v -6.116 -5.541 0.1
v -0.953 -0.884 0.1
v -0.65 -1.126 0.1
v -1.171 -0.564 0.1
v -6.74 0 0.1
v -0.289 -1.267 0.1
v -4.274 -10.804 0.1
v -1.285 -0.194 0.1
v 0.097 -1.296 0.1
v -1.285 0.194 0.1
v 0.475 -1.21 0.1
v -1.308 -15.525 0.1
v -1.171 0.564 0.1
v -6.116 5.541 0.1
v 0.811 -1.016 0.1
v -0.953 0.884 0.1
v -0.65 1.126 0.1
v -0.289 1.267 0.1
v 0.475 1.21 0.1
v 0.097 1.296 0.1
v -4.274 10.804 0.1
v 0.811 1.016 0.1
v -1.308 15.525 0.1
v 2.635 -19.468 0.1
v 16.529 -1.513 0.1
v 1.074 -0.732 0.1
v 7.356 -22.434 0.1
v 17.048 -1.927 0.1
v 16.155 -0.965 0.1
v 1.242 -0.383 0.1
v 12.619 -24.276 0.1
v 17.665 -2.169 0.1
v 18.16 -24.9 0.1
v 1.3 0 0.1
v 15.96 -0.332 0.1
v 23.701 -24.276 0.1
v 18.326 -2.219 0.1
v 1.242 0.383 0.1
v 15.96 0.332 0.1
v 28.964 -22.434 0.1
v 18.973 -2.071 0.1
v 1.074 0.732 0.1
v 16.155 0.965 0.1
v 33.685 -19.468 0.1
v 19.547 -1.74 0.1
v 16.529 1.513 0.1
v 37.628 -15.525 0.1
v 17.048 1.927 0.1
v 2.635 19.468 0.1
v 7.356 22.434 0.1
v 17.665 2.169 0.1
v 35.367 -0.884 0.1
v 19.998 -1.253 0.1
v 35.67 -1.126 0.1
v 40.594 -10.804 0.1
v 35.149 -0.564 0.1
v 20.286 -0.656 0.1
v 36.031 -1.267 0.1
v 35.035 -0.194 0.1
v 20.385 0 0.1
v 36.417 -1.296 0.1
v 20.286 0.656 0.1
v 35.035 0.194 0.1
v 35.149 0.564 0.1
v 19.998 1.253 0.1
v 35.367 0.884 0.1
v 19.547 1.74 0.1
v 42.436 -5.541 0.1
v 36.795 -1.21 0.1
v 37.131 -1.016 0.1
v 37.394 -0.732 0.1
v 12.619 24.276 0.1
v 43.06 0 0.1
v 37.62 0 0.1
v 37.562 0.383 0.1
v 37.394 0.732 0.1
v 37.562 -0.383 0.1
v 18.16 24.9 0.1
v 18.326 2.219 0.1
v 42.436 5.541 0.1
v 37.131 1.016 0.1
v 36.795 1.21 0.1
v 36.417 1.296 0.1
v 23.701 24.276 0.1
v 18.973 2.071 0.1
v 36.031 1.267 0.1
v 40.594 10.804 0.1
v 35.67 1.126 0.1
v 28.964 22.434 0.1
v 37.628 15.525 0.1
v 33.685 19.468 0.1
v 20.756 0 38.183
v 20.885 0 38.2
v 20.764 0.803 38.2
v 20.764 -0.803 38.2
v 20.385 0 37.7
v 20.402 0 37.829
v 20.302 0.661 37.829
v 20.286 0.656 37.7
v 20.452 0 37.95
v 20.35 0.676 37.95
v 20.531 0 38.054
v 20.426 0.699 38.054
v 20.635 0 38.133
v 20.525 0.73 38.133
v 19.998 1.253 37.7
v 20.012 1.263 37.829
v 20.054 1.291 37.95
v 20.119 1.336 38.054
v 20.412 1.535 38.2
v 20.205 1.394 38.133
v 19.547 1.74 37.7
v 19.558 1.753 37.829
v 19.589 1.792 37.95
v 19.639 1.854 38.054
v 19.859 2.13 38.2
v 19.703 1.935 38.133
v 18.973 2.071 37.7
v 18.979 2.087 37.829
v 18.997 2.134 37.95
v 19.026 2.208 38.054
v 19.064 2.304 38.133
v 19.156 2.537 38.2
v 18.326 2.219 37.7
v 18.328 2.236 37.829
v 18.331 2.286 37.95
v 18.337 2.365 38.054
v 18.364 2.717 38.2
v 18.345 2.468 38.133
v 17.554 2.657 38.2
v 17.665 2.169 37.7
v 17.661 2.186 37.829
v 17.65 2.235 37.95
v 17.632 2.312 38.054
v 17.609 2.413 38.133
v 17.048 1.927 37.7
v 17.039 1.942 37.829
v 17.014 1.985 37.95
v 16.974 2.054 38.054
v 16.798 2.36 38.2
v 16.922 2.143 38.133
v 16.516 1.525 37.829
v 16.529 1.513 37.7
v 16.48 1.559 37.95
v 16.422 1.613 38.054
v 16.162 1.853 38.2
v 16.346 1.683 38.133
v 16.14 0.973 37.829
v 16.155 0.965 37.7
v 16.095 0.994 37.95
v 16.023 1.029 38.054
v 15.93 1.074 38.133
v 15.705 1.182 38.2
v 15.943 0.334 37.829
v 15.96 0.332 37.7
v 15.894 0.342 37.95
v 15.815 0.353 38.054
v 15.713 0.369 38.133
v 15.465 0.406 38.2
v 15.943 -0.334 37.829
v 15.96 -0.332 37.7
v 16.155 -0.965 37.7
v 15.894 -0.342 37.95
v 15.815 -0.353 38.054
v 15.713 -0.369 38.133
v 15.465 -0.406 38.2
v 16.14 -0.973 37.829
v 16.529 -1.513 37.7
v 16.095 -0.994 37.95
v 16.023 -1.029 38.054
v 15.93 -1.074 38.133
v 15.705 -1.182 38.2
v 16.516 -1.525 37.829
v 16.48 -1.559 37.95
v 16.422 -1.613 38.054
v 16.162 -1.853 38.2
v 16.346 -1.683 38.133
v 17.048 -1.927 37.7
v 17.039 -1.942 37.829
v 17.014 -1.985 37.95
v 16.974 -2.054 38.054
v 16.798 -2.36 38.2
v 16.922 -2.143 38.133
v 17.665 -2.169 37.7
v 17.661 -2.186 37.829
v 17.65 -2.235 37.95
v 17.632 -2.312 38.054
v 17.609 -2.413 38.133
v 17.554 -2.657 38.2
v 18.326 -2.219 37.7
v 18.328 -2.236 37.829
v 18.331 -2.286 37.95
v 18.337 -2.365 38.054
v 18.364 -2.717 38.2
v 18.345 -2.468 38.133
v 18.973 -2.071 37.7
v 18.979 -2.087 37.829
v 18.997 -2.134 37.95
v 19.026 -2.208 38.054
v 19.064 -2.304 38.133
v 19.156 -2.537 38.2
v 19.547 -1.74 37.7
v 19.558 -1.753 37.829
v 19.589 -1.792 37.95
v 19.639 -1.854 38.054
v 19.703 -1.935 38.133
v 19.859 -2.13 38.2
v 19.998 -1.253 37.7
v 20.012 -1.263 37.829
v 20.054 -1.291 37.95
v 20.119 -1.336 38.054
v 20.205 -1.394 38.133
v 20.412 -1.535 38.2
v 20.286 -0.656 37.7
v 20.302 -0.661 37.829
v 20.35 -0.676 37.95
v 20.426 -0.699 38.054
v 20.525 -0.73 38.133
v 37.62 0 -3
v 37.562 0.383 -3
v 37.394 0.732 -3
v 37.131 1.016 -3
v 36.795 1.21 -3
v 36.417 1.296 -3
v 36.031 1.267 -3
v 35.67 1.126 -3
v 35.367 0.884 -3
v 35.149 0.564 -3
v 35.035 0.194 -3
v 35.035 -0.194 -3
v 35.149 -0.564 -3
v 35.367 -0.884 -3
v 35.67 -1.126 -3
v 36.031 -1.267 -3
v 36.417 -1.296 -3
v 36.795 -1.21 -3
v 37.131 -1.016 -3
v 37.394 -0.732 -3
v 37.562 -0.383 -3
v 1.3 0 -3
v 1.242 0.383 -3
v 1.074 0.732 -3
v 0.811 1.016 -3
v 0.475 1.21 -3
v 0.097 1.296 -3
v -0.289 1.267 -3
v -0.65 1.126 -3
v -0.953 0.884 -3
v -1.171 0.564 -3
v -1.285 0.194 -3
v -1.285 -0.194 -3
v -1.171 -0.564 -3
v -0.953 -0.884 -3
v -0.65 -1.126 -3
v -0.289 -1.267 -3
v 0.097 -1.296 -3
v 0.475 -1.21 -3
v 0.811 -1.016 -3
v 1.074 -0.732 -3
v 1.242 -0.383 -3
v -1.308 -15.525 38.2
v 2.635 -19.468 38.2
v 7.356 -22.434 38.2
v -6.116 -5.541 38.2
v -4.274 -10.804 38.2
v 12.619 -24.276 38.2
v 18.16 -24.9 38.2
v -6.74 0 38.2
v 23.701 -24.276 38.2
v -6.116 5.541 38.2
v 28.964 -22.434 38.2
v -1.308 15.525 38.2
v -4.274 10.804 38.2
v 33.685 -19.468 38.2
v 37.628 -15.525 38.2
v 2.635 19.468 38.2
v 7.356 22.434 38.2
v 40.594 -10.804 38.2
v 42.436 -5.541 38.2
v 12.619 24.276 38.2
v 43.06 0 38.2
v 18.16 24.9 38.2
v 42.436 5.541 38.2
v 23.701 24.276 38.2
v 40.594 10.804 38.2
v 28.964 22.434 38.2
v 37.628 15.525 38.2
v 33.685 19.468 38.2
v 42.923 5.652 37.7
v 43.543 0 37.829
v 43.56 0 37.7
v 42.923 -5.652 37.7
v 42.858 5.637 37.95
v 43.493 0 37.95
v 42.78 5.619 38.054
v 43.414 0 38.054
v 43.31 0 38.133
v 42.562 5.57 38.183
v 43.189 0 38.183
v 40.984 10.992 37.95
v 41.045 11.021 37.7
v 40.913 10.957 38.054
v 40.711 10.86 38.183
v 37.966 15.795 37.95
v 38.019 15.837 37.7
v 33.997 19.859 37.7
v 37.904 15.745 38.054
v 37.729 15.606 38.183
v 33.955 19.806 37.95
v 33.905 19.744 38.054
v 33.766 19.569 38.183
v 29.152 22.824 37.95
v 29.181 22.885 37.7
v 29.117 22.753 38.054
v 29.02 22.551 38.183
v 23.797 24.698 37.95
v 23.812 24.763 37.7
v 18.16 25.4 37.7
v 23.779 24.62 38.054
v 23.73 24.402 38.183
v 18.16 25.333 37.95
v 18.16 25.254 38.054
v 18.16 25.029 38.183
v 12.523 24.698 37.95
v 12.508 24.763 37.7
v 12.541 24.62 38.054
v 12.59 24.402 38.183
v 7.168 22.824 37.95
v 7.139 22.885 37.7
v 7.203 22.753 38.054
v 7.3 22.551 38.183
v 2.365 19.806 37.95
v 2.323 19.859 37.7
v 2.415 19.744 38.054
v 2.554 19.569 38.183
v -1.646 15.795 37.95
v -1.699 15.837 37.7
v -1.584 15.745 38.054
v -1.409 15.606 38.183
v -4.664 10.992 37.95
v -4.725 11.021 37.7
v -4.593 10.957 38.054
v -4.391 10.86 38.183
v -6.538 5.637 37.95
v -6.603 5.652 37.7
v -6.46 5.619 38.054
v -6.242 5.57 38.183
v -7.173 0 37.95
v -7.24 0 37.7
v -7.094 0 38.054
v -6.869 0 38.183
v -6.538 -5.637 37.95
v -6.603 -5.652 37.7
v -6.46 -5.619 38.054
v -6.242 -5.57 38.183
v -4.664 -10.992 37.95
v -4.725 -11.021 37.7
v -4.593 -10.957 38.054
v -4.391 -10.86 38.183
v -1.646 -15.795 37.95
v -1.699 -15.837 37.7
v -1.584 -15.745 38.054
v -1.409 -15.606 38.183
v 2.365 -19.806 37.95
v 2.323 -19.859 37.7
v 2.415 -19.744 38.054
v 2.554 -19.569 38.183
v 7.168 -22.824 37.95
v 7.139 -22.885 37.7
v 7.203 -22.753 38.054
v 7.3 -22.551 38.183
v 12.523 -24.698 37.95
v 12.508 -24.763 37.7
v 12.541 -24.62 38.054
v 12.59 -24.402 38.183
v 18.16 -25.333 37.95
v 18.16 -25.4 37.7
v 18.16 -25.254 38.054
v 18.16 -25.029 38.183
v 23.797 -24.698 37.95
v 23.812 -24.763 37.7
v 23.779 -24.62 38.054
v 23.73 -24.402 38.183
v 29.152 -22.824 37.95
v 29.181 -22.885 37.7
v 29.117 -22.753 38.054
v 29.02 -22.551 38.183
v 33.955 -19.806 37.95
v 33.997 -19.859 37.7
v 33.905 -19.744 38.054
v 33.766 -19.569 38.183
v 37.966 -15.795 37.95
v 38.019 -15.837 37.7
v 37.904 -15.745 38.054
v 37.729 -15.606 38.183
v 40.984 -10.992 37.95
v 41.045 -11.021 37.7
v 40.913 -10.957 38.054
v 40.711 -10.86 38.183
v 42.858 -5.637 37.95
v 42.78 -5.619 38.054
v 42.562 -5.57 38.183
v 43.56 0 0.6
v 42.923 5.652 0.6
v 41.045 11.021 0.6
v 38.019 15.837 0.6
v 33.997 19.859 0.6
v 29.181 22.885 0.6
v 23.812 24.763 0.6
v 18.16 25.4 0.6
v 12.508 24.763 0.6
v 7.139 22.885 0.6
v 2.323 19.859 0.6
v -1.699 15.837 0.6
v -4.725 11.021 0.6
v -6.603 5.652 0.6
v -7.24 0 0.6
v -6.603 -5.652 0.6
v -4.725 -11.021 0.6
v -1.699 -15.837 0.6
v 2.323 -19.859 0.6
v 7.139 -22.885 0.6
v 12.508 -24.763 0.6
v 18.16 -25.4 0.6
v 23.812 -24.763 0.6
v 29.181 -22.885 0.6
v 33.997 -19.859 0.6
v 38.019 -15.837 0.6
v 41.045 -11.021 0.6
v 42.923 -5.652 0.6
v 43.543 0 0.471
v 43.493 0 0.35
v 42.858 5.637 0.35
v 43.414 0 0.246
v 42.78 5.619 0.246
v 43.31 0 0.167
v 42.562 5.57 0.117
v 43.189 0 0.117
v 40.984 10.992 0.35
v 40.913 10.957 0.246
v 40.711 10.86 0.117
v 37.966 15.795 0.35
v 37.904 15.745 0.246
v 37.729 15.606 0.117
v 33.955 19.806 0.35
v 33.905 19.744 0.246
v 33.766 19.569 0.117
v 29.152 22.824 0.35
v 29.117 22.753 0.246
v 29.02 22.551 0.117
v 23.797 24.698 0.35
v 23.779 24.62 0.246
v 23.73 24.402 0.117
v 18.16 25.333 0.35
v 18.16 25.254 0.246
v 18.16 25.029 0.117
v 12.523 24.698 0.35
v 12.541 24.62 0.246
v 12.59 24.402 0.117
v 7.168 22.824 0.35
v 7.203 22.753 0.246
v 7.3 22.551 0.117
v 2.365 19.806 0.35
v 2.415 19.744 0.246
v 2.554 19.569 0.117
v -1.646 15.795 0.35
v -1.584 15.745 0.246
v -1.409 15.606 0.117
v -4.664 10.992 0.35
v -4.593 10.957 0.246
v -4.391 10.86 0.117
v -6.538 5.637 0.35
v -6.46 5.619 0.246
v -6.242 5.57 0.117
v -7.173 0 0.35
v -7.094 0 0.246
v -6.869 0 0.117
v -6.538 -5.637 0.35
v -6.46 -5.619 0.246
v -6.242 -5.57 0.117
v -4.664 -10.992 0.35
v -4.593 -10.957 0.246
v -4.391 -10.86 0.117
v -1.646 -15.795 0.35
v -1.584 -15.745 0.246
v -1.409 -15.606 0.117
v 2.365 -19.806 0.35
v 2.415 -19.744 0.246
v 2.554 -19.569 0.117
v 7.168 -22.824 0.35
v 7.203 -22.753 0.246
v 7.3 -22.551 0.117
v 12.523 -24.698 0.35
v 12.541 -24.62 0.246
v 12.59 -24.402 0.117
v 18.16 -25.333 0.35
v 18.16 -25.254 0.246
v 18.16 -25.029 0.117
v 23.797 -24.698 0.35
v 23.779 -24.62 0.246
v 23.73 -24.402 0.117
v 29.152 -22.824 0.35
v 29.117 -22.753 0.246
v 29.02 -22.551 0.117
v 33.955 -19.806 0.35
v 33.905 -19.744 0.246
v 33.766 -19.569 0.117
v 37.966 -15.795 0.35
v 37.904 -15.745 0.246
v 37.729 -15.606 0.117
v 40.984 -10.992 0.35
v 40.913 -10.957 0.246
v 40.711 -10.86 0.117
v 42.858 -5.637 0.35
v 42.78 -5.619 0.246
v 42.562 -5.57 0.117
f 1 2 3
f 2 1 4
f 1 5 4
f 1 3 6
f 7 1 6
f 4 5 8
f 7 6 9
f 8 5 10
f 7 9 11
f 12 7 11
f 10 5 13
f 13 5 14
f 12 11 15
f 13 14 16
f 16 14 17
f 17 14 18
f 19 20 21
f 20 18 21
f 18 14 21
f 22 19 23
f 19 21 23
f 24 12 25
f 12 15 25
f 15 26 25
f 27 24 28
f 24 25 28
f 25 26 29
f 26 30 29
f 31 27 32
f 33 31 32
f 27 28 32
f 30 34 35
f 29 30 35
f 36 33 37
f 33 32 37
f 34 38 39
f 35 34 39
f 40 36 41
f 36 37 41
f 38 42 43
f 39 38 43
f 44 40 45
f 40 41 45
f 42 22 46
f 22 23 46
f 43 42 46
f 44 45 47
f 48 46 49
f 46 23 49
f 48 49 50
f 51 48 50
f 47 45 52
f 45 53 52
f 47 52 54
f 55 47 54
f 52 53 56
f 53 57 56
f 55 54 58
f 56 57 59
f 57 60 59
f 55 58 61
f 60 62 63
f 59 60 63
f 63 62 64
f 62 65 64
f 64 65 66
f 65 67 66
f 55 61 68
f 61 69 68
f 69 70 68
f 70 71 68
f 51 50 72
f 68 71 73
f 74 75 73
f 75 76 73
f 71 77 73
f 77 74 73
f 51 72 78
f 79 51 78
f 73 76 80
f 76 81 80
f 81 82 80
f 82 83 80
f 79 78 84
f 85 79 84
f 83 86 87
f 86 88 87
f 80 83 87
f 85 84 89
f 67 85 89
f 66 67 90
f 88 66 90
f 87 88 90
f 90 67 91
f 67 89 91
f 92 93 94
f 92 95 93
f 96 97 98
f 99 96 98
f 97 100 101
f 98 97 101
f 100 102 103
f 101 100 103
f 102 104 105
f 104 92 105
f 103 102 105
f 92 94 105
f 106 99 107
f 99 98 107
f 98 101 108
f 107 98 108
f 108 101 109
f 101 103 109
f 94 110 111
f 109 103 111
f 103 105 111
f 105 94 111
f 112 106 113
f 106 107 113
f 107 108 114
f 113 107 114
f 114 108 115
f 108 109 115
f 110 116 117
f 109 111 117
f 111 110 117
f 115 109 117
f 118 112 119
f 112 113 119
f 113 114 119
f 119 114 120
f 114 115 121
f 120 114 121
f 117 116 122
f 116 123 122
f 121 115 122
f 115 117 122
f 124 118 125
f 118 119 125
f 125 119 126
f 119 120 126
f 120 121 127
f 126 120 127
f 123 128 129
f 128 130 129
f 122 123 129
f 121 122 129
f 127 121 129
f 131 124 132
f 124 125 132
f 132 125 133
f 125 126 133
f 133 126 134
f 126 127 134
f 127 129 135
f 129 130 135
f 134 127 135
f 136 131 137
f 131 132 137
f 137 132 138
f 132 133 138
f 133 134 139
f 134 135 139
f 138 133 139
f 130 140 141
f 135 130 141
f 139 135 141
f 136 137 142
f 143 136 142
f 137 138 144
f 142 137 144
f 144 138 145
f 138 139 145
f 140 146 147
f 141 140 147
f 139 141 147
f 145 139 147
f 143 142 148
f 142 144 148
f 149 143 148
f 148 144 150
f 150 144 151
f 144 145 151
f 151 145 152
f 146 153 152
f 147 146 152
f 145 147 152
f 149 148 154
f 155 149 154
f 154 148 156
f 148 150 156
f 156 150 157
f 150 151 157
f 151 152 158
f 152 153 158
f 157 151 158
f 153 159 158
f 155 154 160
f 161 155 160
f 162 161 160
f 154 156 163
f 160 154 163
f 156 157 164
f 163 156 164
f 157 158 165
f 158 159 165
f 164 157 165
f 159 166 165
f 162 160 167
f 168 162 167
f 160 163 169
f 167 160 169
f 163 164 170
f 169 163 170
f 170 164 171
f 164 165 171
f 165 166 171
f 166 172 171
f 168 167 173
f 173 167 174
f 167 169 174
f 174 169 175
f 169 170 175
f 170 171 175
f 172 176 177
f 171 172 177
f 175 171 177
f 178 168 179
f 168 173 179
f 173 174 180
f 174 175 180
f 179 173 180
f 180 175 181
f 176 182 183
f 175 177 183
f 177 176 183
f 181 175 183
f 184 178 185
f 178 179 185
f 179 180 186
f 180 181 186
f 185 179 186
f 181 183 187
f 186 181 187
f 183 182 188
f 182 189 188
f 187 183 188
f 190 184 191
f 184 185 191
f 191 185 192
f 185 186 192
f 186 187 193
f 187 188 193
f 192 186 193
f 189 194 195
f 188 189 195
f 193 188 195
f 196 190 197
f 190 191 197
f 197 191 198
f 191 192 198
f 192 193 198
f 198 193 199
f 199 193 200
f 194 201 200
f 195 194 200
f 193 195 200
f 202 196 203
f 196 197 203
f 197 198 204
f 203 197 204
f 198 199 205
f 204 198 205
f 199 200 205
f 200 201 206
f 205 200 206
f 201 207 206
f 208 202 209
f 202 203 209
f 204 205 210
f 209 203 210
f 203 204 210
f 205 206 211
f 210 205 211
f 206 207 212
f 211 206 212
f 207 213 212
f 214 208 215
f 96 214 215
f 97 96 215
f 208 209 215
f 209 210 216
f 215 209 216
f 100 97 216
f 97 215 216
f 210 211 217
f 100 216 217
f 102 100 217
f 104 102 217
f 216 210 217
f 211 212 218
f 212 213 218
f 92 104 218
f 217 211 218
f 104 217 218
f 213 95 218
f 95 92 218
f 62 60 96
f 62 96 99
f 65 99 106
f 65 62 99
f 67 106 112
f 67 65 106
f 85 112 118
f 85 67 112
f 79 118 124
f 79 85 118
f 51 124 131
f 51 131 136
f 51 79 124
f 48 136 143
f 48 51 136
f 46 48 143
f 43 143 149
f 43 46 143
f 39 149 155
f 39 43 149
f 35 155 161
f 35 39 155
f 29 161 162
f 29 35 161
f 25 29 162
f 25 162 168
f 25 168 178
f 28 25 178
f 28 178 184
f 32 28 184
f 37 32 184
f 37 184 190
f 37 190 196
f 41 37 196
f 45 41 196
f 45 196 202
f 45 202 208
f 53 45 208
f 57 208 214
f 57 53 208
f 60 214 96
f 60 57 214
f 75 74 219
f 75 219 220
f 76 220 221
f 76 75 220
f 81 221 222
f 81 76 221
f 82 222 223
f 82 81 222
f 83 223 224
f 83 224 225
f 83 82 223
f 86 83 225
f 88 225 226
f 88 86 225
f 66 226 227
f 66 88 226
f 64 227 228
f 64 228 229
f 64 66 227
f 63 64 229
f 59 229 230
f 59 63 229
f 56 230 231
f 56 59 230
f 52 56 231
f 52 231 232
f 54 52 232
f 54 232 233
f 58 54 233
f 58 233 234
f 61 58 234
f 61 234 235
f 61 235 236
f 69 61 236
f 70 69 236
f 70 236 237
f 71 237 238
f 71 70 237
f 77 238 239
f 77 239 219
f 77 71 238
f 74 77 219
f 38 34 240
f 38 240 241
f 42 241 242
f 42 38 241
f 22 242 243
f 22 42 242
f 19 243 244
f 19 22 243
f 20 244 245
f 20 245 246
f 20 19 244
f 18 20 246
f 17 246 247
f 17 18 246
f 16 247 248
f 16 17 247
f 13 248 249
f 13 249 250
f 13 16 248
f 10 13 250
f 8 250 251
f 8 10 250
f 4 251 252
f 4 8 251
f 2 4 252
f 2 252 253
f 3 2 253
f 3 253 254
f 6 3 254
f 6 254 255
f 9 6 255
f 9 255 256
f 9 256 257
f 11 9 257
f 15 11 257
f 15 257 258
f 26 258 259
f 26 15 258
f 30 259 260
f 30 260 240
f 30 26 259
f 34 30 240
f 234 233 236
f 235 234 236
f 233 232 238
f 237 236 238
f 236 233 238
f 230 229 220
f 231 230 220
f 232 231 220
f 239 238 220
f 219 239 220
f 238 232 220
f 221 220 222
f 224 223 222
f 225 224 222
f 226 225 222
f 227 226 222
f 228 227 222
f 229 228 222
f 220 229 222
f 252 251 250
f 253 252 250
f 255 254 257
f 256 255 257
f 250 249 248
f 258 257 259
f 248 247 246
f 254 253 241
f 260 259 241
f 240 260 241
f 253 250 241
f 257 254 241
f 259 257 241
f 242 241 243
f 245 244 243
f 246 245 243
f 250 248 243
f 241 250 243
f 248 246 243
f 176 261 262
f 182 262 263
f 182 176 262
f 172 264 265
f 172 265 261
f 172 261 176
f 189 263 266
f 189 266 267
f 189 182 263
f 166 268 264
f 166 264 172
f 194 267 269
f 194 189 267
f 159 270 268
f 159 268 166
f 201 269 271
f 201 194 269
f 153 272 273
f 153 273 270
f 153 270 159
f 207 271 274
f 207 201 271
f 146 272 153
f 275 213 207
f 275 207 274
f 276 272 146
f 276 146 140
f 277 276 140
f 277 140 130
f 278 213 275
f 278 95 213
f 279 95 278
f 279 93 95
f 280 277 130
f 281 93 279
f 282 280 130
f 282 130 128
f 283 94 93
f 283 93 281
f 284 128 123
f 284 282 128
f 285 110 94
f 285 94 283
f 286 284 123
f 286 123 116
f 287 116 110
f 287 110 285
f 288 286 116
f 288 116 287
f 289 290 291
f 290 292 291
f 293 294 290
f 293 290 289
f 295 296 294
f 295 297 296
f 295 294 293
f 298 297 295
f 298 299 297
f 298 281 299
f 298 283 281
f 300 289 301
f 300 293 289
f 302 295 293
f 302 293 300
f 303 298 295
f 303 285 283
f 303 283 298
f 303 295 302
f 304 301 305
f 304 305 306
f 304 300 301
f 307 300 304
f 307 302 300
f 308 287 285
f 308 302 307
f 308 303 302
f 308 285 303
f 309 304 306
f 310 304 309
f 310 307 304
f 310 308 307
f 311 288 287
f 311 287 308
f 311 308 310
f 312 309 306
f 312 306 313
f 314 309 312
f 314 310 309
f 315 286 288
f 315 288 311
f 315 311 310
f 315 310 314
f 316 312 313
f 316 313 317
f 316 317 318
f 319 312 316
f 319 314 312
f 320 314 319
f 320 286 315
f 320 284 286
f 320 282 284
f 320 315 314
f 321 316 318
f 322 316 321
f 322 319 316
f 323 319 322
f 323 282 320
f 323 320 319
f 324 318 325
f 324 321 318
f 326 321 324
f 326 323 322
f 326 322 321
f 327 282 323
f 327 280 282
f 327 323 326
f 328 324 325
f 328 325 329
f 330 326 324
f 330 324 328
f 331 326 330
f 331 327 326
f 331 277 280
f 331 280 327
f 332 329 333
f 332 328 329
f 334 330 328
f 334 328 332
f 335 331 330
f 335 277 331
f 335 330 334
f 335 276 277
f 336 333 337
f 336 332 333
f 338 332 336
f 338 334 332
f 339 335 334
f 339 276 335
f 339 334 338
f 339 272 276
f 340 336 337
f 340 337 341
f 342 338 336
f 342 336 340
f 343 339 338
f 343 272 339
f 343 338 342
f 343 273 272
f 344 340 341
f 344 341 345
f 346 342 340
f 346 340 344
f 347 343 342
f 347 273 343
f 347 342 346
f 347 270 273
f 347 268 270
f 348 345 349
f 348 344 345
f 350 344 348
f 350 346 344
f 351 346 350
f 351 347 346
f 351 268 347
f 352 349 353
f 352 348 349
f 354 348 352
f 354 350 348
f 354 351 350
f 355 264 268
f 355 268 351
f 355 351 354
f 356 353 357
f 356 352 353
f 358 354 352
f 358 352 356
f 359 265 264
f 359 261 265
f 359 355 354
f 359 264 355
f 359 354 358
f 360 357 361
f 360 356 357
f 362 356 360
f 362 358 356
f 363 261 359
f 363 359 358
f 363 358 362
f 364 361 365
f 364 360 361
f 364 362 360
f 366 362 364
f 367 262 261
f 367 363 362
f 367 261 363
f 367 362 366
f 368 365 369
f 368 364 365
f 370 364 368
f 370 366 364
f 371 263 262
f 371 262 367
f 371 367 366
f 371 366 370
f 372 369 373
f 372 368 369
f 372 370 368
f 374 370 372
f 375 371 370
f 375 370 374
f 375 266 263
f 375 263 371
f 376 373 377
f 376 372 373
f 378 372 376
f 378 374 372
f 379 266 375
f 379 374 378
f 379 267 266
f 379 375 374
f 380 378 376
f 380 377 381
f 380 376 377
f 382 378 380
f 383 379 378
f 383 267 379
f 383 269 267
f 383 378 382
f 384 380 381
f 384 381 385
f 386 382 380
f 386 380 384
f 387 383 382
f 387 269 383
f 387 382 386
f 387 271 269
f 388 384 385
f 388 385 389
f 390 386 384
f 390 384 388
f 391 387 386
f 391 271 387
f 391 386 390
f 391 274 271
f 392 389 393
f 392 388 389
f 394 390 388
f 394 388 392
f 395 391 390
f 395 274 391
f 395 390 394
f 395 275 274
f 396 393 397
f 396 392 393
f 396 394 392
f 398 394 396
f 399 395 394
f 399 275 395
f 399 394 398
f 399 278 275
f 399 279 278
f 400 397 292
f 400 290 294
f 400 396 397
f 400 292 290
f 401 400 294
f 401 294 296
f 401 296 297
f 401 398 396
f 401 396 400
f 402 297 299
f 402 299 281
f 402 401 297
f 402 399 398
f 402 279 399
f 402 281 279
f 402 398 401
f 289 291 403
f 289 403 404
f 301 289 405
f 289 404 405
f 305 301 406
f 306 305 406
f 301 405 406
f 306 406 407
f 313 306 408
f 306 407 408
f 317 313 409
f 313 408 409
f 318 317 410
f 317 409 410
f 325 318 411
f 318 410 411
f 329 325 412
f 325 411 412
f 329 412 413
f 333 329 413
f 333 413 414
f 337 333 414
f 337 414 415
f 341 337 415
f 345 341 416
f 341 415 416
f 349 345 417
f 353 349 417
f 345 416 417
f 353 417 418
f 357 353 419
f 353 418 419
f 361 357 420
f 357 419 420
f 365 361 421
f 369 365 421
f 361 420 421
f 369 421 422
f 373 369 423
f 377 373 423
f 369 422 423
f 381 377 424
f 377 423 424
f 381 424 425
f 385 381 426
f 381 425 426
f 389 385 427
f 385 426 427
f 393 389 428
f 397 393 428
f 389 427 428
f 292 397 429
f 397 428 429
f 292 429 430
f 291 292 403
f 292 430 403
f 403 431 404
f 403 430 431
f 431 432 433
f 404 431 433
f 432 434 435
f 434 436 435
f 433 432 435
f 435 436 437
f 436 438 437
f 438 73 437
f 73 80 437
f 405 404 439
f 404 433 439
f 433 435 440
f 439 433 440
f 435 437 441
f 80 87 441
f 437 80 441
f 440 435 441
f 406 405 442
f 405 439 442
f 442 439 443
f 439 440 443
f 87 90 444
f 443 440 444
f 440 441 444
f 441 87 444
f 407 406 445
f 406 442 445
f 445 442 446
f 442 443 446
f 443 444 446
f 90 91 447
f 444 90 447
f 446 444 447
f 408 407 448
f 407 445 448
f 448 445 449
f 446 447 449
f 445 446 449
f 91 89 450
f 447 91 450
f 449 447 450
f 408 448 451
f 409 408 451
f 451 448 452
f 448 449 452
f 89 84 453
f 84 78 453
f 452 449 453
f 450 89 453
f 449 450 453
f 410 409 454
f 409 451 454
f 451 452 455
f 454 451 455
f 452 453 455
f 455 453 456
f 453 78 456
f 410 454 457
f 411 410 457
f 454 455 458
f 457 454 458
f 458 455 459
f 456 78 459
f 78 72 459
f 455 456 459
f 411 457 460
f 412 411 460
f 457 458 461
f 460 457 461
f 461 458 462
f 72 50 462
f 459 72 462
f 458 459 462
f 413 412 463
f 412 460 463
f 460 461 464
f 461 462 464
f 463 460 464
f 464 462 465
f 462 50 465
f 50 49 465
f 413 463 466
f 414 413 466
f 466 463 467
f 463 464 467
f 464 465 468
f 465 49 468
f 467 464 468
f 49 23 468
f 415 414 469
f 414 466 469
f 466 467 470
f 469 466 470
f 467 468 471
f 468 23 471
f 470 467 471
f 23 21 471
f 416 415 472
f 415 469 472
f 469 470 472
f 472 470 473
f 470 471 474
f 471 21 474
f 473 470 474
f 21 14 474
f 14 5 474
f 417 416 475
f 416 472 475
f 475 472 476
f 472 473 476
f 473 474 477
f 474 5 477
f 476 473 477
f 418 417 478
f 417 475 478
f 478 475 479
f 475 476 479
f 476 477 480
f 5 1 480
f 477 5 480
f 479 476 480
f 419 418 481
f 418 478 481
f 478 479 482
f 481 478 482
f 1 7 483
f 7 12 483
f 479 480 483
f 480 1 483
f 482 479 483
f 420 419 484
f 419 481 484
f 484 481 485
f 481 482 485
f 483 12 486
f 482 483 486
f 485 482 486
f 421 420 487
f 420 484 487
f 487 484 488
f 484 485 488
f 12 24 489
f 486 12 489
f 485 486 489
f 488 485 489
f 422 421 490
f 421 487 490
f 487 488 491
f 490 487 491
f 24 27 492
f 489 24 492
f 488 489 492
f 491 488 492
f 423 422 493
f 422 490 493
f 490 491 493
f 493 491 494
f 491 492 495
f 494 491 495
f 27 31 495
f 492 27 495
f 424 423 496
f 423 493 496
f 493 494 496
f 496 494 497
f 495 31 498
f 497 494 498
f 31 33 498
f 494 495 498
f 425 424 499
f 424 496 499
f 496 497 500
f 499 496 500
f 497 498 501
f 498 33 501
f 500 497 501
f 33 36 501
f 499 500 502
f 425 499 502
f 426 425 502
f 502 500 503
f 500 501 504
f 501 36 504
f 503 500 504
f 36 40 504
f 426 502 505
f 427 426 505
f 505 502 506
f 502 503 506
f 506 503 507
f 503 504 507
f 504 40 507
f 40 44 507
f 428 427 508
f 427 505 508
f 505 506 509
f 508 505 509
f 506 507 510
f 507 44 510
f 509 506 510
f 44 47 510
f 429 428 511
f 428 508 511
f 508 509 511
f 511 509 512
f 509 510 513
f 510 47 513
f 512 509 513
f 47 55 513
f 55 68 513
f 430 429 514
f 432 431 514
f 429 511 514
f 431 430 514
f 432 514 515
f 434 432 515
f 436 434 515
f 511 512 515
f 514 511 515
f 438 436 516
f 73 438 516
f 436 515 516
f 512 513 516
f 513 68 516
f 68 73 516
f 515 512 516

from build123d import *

# Parameters (mm, degrees)
SKETCH001_R       = 1.3
PAD001_DEPTH      = 19.05
PAD001_DEPTH_BACK = 3.5
SKETCH_R          = 25.4
SKETCH_R_2        = 2.225
PAD_DEPTH         = 38.1
FILLET_R          = 0.5


with BuildPart() as pad001:
    # Sketch001 → Pad001 (new body, two sides)
    with BuildSketch(Plane.XY.offset(0.5)) as pad001_sk:
        Circle(SKETCH001_R)
        with Locations((36.32, 0)):
            Circle(SKETCH001_R)
    extrude(amount=PAD001_DEPTH)
    extrude(pad001_sk.sketch, amount=-PAD001_DEPTH_BACK)


with BuildPart() as fillet_mp_cp:
    # Sketch → Pad (new body)
    with BuildSketch(Plane.XY.offset(0.1)):
        with Locations((18.16, 0)):
            Circle(SKETCH_R)
        with Locations((18.16, 0)):
            Circle(SKETCH_R_2, mode=Mode.SUBTRACT)
    extrude(amount=PAD_DEPTH)

    # Fillet
    fillet_edges = [fillet_mp_cp.edges().sort_by_distance(p)[0] for p in [
        (15.935, 0, 38.2),
        (-7.24, 0, 38.2),
        (-7.24, 0, 0.1),
    ]]
    fillet(fillet_edges, radius=FILLET_R)

    # Fillet_mp_cp: union Pad001
    add(pad001.part)


solid = fillet_mp_cp.part
